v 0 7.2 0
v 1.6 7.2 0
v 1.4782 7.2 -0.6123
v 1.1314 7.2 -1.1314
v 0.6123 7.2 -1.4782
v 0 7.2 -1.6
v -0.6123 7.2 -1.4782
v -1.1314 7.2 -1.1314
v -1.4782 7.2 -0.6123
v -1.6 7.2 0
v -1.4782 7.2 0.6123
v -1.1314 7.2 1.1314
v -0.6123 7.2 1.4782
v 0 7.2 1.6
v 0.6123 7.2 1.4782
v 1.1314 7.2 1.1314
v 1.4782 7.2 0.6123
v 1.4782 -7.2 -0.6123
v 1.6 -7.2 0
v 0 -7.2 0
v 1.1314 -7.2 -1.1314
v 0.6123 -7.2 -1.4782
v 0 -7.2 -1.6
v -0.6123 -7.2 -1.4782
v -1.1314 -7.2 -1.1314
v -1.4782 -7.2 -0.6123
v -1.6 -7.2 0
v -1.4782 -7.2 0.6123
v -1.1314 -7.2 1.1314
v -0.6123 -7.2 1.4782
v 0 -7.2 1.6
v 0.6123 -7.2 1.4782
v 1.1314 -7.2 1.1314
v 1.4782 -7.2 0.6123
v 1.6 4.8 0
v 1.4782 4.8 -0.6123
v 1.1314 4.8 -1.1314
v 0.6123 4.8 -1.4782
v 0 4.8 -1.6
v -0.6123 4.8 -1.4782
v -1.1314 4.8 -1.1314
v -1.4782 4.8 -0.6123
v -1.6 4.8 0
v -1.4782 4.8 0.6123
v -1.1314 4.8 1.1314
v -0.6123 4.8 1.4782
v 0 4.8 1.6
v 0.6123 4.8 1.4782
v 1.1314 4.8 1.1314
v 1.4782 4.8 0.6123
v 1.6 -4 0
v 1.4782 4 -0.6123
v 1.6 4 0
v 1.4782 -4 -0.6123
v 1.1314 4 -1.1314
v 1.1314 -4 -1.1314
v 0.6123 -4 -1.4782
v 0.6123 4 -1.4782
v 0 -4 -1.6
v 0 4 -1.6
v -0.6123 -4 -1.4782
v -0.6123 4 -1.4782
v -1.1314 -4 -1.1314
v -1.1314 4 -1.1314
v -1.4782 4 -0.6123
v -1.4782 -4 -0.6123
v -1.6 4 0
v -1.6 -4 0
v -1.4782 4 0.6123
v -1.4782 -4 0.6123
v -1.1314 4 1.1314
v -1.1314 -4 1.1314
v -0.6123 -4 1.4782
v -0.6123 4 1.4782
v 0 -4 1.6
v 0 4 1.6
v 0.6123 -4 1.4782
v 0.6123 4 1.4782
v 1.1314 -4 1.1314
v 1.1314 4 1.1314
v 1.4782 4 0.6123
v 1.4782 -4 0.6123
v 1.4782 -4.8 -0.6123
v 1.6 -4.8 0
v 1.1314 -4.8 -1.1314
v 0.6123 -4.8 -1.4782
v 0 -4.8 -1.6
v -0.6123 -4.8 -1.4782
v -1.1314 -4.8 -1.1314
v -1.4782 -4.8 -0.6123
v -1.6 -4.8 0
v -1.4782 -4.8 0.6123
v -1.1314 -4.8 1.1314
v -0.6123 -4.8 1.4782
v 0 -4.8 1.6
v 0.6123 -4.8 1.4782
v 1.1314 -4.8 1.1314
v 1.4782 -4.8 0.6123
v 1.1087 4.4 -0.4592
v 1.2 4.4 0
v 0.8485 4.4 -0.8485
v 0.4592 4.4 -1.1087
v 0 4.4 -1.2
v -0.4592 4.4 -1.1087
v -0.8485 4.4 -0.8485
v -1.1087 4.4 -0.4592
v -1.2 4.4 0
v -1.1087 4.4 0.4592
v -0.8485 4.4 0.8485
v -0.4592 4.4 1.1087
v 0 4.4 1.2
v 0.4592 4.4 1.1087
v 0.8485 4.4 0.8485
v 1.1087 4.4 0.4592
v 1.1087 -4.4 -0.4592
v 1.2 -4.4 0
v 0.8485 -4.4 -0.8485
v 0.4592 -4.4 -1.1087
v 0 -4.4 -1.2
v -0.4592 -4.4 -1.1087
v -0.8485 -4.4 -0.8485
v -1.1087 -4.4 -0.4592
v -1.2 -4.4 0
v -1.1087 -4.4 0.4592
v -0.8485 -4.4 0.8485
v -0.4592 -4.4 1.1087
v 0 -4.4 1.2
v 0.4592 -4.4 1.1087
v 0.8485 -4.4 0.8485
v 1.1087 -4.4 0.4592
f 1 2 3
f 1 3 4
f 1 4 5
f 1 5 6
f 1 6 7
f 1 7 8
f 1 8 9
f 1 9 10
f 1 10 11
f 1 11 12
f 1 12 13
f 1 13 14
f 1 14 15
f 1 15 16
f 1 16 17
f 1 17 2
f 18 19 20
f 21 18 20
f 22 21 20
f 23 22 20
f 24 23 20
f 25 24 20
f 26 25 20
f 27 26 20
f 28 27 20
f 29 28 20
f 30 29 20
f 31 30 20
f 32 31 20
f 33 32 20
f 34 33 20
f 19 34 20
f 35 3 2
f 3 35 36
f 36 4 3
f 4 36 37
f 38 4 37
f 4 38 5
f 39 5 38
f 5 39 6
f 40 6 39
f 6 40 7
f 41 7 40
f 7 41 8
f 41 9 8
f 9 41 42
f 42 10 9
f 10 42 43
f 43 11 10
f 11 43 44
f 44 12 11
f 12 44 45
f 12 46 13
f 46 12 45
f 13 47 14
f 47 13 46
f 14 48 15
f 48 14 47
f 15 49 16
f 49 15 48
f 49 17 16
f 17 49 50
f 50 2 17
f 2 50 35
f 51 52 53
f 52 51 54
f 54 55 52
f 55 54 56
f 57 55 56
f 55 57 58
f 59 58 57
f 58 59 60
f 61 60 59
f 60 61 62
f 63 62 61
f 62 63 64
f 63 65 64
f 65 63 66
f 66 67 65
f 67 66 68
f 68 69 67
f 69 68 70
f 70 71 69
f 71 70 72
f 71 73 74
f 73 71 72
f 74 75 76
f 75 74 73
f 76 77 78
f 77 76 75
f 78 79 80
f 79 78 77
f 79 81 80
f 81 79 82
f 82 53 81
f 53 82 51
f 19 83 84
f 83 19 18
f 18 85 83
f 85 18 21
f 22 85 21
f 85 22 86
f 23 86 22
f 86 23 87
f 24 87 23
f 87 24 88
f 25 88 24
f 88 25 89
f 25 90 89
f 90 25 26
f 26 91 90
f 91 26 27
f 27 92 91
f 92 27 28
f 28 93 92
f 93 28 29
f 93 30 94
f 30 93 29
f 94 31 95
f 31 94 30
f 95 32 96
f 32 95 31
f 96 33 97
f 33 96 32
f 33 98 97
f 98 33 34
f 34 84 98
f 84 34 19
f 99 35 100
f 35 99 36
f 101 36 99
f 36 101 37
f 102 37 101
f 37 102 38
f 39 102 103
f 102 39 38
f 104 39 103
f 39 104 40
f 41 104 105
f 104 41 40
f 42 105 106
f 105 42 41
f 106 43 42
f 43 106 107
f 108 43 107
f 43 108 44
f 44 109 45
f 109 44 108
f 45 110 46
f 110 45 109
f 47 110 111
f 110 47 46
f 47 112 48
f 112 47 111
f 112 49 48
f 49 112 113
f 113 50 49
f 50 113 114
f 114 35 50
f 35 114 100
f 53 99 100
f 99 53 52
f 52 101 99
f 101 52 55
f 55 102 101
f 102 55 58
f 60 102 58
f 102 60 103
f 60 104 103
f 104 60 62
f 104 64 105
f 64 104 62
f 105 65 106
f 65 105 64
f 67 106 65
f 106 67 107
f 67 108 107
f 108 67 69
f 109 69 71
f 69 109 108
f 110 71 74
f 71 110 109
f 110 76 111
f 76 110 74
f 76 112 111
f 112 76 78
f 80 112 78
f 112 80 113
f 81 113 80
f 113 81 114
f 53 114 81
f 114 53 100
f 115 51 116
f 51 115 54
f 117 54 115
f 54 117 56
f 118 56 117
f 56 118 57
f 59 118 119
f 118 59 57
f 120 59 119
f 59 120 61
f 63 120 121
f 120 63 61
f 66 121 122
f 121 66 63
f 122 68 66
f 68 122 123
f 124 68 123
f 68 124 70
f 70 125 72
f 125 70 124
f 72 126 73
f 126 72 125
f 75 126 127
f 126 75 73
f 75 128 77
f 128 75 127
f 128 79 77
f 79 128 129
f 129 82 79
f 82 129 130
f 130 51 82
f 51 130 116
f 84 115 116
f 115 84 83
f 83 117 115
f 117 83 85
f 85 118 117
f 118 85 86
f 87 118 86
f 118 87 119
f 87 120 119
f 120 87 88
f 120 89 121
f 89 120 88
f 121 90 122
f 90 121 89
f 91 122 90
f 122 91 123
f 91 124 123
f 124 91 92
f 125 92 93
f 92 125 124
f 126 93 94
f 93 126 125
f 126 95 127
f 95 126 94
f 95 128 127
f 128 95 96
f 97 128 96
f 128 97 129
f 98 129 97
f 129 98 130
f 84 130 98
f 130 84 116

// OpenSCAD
// file: ../p/4-4edge.scad
use <../lib.scad>
function ldraw_lib__4_4edge() = [
// 0 Circle 1.0
// 0 Name: 4-4edge.dat
// 0 Author: James Jessiman
// 0 !LDRAW_ORG Primitive UPDATE 2017-01
// 0 !LICENSE Licensed under CC BY 2.0 and CC BY 4.0 : see CAreadme.txt
// 
// 0 BFC CERTIFY CCW
  [0,"BFC","CERTIFY"],
  [0,"BFC","CCW"],
// 
// 0 !HISTORY 1998-12-15 [PTadmin] Official Update 1998-10
// 0 !HISTORY 2005-12-28 [PTadmin] Official Update 2005-01
// 0 !HISTORY 2007-06-24 [PTadmin] Header formatted for Contributor Agreement
// 0 !HISTORY 2008-07-01 [PTadmin] Official Update 2008-01
// 0 !HISTORY 2017-01-15 [Steffen] BFCed
// 0 !HISTORY 2017-12-30 [PTadmin] Official Update 2017-01
// 
// 
// 2 24 1 0 0 0.9239 0 0.3827
  [2,24,1,0,0,0.9239,0,0.3827],
// 2 24 0.9239 0 0.3827 0.7071 0 0.7071
  [2,24,0.9239,0,0.3827,0.7071,0,0.7071],
// 2 24 0.7071 0 0.7071 0.3827 0 0.9239
  [2,24,0.7071,0,0.7071,0.3827,0,0.9239],
// 2 24 0.3827 0 0.9239 0 0 1
  [2,24,0.3827,0,0.9239,0,0,1],
// 2 24 0 0 1 -0.3827 0 0.9239
  [2,24,0,0,1,-0.3827,0,0.9239],
// 2 24 -0.3827 0 0.9239 -0.7071 0 0.7071
  [2,24,-0.3827,0,0.9239,-0.7071,0,0.7071],
// 2 24 -0.7071 0 0.7071 -0.9239 0 0.3827
  [2,24,-0.7071,0,0.7071,-0.9239,0,0.3827],
// 2 24 -0.9239 0 0.3827 -1 0 -0
  [2,24,-0.9239,0,0.3827,-1,0,-0],
// 2 24 -1 0 -0 -0.9239 0 -0.3827
  [2,24,-1,0,-0,-0.9239,0,-0.3827],
// 2 24 -0.9239 0 -0.3827 -0.7071 0 -0.7071
  [2,24,-0.9239,0,-0.3827,-0.7071,0,-0.7071],
// 2 24 -0.7071 0 -0.7071 -0.3827 0 -0.9239
  [2,24,-0.7071,0,-0.7071,-0.3827,0,-0.9239],
// 2 24 -0.3827 0 -0.9239 0 0 -1
  [2,24,-0.3827,0,-0.9239,0,0,-1],
// 2 24 0 0 -1 0.3827 0 -0.9239
  [2,24,0,0,-1,0.3827,0,-0.9239],
// 2 24 0.3827 0 -0.9239 0.7071 0 -0.7071
  [2,24,0.3827,0,-0.9239,0.7071,0,-0.7071],
// 2 24 0.7071 0 -0.7071 0.9239 0 -0.3827
  [2,24,0.7071,0,-0.7071,0.9239,0,-0.3827],
// 2 24 0.9239 0 -0.3827 1 0 0
  [2,24,0.9239,0,-0.3827,1,0,0],
];
makepoly(ldraw_lib__4_4edge(), line=0.2);
// file: ../p/4-4disc.scad
use <../lib.scad>
function ldraw_lib__4_4disc() = [
// 0 Disc 1.0
// 0 Name: 4-4disc.dat
// 0 Author: James Jessiman
// 0 !LDRAW_ORG Primitive UPDATE 2002-02
// 0 !LICENSE Licensed under CC BY 2.0 and CC BY 4.0 : see CAreadme.txt
// 
// 0 BFC CERTIFY CCW
  [0,"BFC","CERTIFY"],
  [0,"BFC","CCW"],
// 
// 0 !HISTORY 1998-12-15 [PTadmin] Official Update 1998-10
// 0 !HISTORY 2002-03-23 [sbliss] Added BFC statement
// 0 !HISTORY 2002-04-25 [PTadmin] Official Update 2002-02
// 0 !HISTORY 2007-06-24 [PTadmin] Header formatted for Contributor Agreement
// 0 !HISTORY 2008-07-01 [PTadmin] Official Update 2008-01
// 
// 
// 3 16 0 0 0 1 0 0 0.9239 0 0.3827
  [3,16,0,0,0,1,0,0,0.9239,0,0.3827],
// 3 16 0 0 0 0.9239 0 0.3827 0.7071 0 0.7071
  [3,16,0,0,0,0.9239,0,0.3827,0.7071,0,0.7071],
// 3 16 0 0 0 0.7071 0 0.7071 0.3827 0 0.9239
  [3,16,0,0,0,0.7071,0,0.7071,0.3827,0,0.9239],
// 3 16 0 0 0 0.3827 0 0.9239 0 0 1
  [3,16,0,0,0,0.3827,0,0.9239,0,0,1],
// 3 16 0 0 0 0 0 1 -0.3827 0 0.9239
  [3,16,0,0,0,0,0,1,-0.3827,0,0.9239],
// 3 16 0 0 0 -0.3827 0 0.9239 -0.7071 0 0.7071
  [3,16,0,0,0,-0.3827,0,0.9239,-0.7071,0,0.7071],
// 3 16 0 0 0 -0.7071 0 0.7071 -0.9239 0 0.3827
  [3,16,0,0,0,-0.7071,0,0.7071,-0.9239,0,0.3827],
// 3 16 0 0 0 -0.9239 0 0.3827 -1 0 -0
  [3,16,0,0,0,-0.9239,0,0.3827,-1,0,-0],
// 3 16 0 0 0 -1 0 -0 -0.9239 0 -0.3827
  [3,16,0,0,0,-1,0,-0,-0.9239,0,-0.3827],
// 3 16 0 0 0 -0.9239 0 -0.3827 -0.7071 0 -0.7071
  [3,16,0,0,0,-0.9239,0,-0.3827,-0.7071,0,-0.7071],
// 3 16 0 0 0 -0.7071 0 -0.7071 -0.3827 0 -0.9239
  [3,16,0,0,0,-0.7071,0,-0.7071,-0.3827,0,-0.9239],
// 3 16 0 0 0 -0.3827 0 -0.9239 0 0 -1
  [3,16,0,0,0,-0.3827,0,-0.9239,0,0,-1],
// 3 16 0 0 0 0 0 -1 0.3827 0 -0.9239
  [3,16,0,0,0,0,0,-1,0.3827,0,-0.9239],
// 3 16 0 0 0 0.3827 0 -0.9239 0.7071 0 -0.7071
  [3,16,0,0,0,0.3827,0,-0.9239,0.7071,0,-0.7071],
// 3 16 0 0 0 0.7071 0 -0.7071 0.9239 0 -0.3827
  [3,16,0,0,0,0.7071,0,-0.7071,0.9239,0,-0.3827],
// 3 16 0 0 0 0.9239 0 -0.3827 1 0 0
  [3,16,0,0,0,0.9239,0,-0.3827,1,0,0],
// 0
];
makepoly(ldraw_lib__4_4disc(), line=0.2);
// file: ../p/4-4cyli.scad
use <../lib.scad>
function ldraw_lib__4_4cyli() = [
// 0 Cylinder 1.0
// 0 Name: 4-4cyli.dat
// 0 Author: James Jessiman
// 0 !LDRAW_ORG Primitive UPDATE 2005-01
// 0 !LICENSE Licensed under CC BY 2.0 and CC BY 4.0 : see CAreadme.txt
// 
// 0 BFC CERTIFY CCW
  [0,"BFC","CERTIFY"],
  [0,"BFC","CCW"],
// 
// 0 !HISTORY 1998-12-15 [PTadmin] Official Update 1998-10
// 0 !HISTORY 2002-03-23 [sbliss] Added BFC statement; merged headers from files in distributions LDraw 0.27 and Complete.
// 0 !HISTORY 2002-04-25 [PTadmin] Official Update 2002-02
// 0 !HISTORY 2004-12-14 [guyvivan] BFC CCW
// 0 !HISTORY 2005-12-28 [PTadmin] Official Update 2005-01
// 0 !HISTORY 2007-06-24 [PTadmin] Header formatted for Contributor Agreement
// 0 !HISTORY 2008-07-01 [PTadmin] Official Update 2008-01
// 
// 
// 4 16 1 1 0 0.9239 1 0.3827 0.9239 0 0.3827 1 0 0
  [4,16,1,1,0,0.9239,1,0.3827,0.9239,0,0.3827,1,0,0],
// 5 24 1 0 0 1 1 0 0.9239 0 0.3827 0.9239 0 -0.3827
  [5,24,1,0,0,1,1,0,0.9239,0,0.3827,0.9239,0,-0.3827],
// 4 16 0.9239 1 0.3827 0.7071 1 0.7071 0.7071 0 0.7071 0.9239 0 0.3827
  [4,16,0.9239,1,0.3827,0.7071,1,0.7071,0.7071,0,0.7071,0.9239,0,0.3827],
// 5 24 0.9239 0 0.3827 0.9239 1 0.3827 0.7071 0 0.7071 1 0 0
  [5,24,0.9239,0,0.3827,0.9239,1,0.3827,0.7071,0,0.7071,1,0,0],
// 4 16 0.7071 1 0.7071 0.3827 1 0.9239 0.3827 0 0.9239 0.7071 0 0.7071
  [4,16,0.7071,1,0.7071,0.3827,1,0.9239,0.3827,0,0.9239,0.7071,0,0.7071],
// 5 24 0.7071 0 0.7071 0.7071 1 0.7071 0.3827 0 0.9239 0.9239 0 0.3827
  [5,24,0.7071,0,0.7071,0.7071,1,0.7071,0.3827,0,0.9239,0.9239,0,0.3827],
// 4 16 0.3827 1 0.9239 0 1 1 0 0 1 0.3827 0 0.9239
  [4,16,0.3827,1,0.9239,0,1,1,0,0,1,0.3827,0,0.9239],
// 5 24 0.3827 0 0.9239 0.3827 1 0.9239 0 0 1 0.7071 0 0.7071
  [5,24,0.3827,0,0.9239,0.3827,1,0.9239,0,0,1,0.7071,0,0.7071],
// 4 16 0 1 1 -0.3827 1 0.9239 -0.3827 0 0.9239 0 0 1
  [4,16,0,1,1,-0.3827,1,0.9239,-0.3827,0,0.9239,0,0,1],
// 5 24 0 0 1 0 1 1 -0.3827 0 0.9239 0.3827 0 0.9239
  [5,24,0,0,1,0,1,1,-0.3827,0,0.9239,0.3827,0,0.9239],
// 4 16 -0.3827 1 0.9239 -0.7071 1 0.7071 -0.7071 0 0.7071 -0.3827 0 0.9239
  [4,16,-0.3827,1,0.9239,-0.7071,1,0.7071,-0.7071,0,0.7071,-0.3827,0,0.9239],
// 5 24 -0.3827 0 0.9239 -0.3827 1 0.9239 -0.7071 0 0.7071 0 0 1
  [5,24,-0.3827,0,0.9239,-0.3827,1,0.9239,-0.7071,0,0.7071,0,0,1],
// 4 16 -0.7071 1 0.7071 -0.9239 1 0.3827 -0.9239 0 0.3827 -0.7071 0 0.7071
  [4,16,-0.7071,1,0.7071,-0.9239,1,0.3827,-0.9239,0,0.3827,-0.7071,0,0.7071],
// 5 24 -0.7071 0 0.7071 -0.7071 1 0.7071 -0.9239 0 0.3827 -0.3827 0 0.9239
  [5,24,-0.7071,0,0.7071,-0.7071,1,0.7071,-0.9239,0,0.3827,-0.3827,0,0.9239],
// 4 16 -0.9239 1 0.3827 -1 1 0 -1 0 0 -0.9239 0 0.3827
  [4,16,-0.9239,1,0.3827,-1,1,0,-1,0,0,-0.9239,0,0.3827],
// 5 24 -0.9239 0 0.3827 -0.9239 1 0.3827 -1 0 0 -0.7071 0 0.7071
  [5,24,-0.9239,0,0.3827,-0.9239,1,0.3827,-1,0,0,-0.7071,0,0.7071],
// 4 16 -1 1 0 -0.9239 1 -0.3827 -0.9239 0 -0.3827 -1 0 0
  [4,16,-1,1,0,-0.9239,1,-0.3827,-0.9239,0,-0.3827,-1,0,0],
// 5 24 -1 0 0 -1 1 0 -0.9239 0 -0.3827 -0.9239 0 0.3827
  [5,24,-1,0,0,-1,1,0,-0.9239,0,-0.3827,-0.9239,0,0.3827],
// 4 16 -0.9239 1 -0.3827 -0.7071 1 -0.7071 -0.7071 0 -0.7071 -0.9239 0 -0.3827
  [4,16,-0.9239,1,-0.3827,-0.7071,1,-0.7071,-0.7071,0,-0.7071,-0.9239,0,-0.3827],
// 5 24 -0.9239 0 -0.3827 -0.9239 1 -0.3827 -0.7071 0 -0.7071 -1 0 0
  [5,24,-0.9239,0,-0.3827,-0.9239,1,-0.3827,-0.7071,0,-0.7071,-1,0,0],
// 4 16 -0.7071 1 -0.7071 -0.3827 1 -0.9239 -0.3827 0 -0.9239 -0.7071 0 -0.7071
  [4,16,-0.7071,1,-0.7071,-0.3827,1,-0.9239,-0.3827,0,-0.9239,-0.7071,0,-0.7071],
// 5 24 -0.7071 0 -0.7071 -0.7071 1 -0.7071 -0.3827 0 -0.9239 -0.9239 0 -0.3827
  [5,24,-0.7071,0,-0.7071,-0.7071,1,-0.7071,-0.3827,0,-0.9239,-0.9239,0,-0.3827],
// 4 16 -0.3827 1 -0.9239 0 1 -1 0 0 -1 -0.3827 0 -0.9239
  [4,16,-0.3827,1,-0.9239,0,1,-1,0,0,-1,-0.3827,0,-0.9239],
// 5 24 -0.3827 0 -0.9239 -0.3827 1 -0.9239 0 0 -1 -0.7071 0 -0.7071
  [5,24,-0.3827,0,-0.9239,-0.3827,1,-0.9239,0,0,-1,-0.7071,0,-0.7071],
// 4 16 0 1 -1 0.3827 1 -0.9239 0.3827 0 -0.9239 0 0 -1
  [4,16,0,1,-1,0.3827,1,-0.9239,0.3827,0,-0.9239,0,0,-1],
// 5 24 0 0 -1 0 1 -1 0.3827 0 -0.9239 -0.3827 0 -0.9239
  [5,24,0,0,-1,0,1,-1,0.3827,0,-0.9239,-0.3827,0,-0.9239],
// 4 16 0.3827 1 -0.9239 0.7071 1 -0.7071 0.7071 0 -0.7071 0.3827 0 -0.9239
  [4,16,0.3827,1,-0.9239,0.7071,1,-0.7071,0.7071,0,-0.7071,0.3827,0,-0.9239],
// 5 24 0.3827 0 -0.9239 0.3827 1 -0.9239 0.7071 0 -0.7071 0 0 -1
  [5,24,0.3827,0,-0.9239,0.3827,1,-0.9239,0.7071,0,-0.7071,0,0,-1],
// 4 16 0.7071 1 -0.7071 0.9239 1 -0.3827 0.9239 0 -0.3827 0.7071 0 -0.7071
  [4,16,0.7071,1,-0.7071,0.9239,1,-0.3827,0.9239,0,-0.3827,0.7071,0,-0.7071],
// 5 24 0.7071 0 -0.7071 0.7071 1 -0.7071 0.9239 0 -0.3827 0.3827 0 -0.9239
  [5,24,0.7071,0,-0.7071,0.7071,1,-0.7071,0.9239,0,-0.3827,0.3827,0,-0.9239],
// 4 16 0.9239 1 -0.3827 1 1 0 1 0 0 0.9239 0 -0.3827
  [4,16,0.9239,1,-0.3827,1,1,0,1,0,0,0.9239,0,-0.3827],
// 5 24 0.9239 0 -0.3827 0.9239 1 -0.3827 1 0 0 0.7071 0 -0.7071
  [5,24,0.9239,0,-0.3827,0.9239,1,-0.3827,1,0,0,0.7071,0,-0.7071],
// 0
];
makepoly(ldraw_lib__4_4cyli(), line=0.2);
// file: ../p/4-4con3.scad
use <../lib.scad>
function ldraw_lib__4_4con3() = [
// 0 Cone  3 x 1.0
// 0 Name: 4-4con3.dat
// 0 Author: Niels Karsdorp [nielsk]
// 0 !LDRAW_ORG Primitive UPDATE 2003-02
// 0 !LICENSE Licensed under CC BY 2.0 and CC BY 4.0 : see CAreadme.txt
// 
// 0 BFC CERTIFY CCW
  [0,"BFC","CERTIFY"],
  [0,"BFC","CCW"],
// 
// 0 !HISTORY 2003-08-01 [PTadmin] Official Update 2003-02
// 0 !HISTORY 2007-06-24 [PTadmin] Header formatted for Contributor Agreement
// 0 !HISTORY 2008-07-01 [PTadmin] Official Update 2008-01
// 
// 
// 5 24 3 1 0 4 0 0 2.7717 1 1.1481 2.7717 1 -1.1481
  [5,24,3,1,0,4,0,0,2.7717,1,1.1481,2.7717,1,-1.1481],
// 5 24 2.7717 1 1.1481 3.6956 0 1.5308 2.1213 1 2.1213 3 1 0
  [5,24,2.7717,1,1.1481,3.6956,0,1.5308,2.1213,1,2.1213,3,1,0],
// 5 24 2.1213 1 2.1213 2.8284 0 2.8284 1.1481 1 2.7717 2.7717 1 1.1481
  [5,24,2.1213,1,2.1213,2.8284,0,2.8284,1.1481,1,2.7717,2.7717,1,1.1481],
// 5 24 1.1481 1 2.7717 1.5308 0 3.6956 0 1 3 2.1213 1 2.1213
  [5,24,1.1481,1,2.7717,1.5308,0,3.6956,0,1,3,2.1213,1,2.1213],
// 5 24 0 1 3 0 0 4 -1.1481 1 2.7717 1.1481 1 2.7717
  [5,24,0,1,3,0,0,4,-1.1481,1,2.7717,1.1481,1,2.7717],
// 5 24 -1.1481 1 2.7717 -1.5308 0 3.6956 -2.1213 1 2.1213 0 1 3
  [5,24,-1.1481,1,2.7717,-1.5308,0,3.6956,-2.1213,1,2.1213,0,1,3],
// 5 24 -2.1213 1 2.1213 -2.8284 0 2.8284 -2.7717 1 1.1481 -1.1481 1 2.7717
  [5,24,-2.1213,1,2.1213,-2.8284,0,2.8284,-2.7717,1,1.1481,-1.1481,1,2.7717],
// 5 24 -2.7717 1 1.1481 -3.6956 0 1.5308 -3 1 0 -2.1213 1 2.1213
  [5,24,-2.7717,1,1.1481,-3.6956,0,1.5308,-3,1,0,-2.1213,1,2.1213],
// 5 24 -3 1 0 -4 0 0 -2.7717 1 -1.1481 -2.7717 1 1.1481
  [5,24,-3,1,0,-4,0,0,-2.7717,1,-1.1481,-2.7717,1,1.1481],
// 5 24 -2.7717 1 -1.1481 -3.6956 0 -1.5308 -2.1213 1 -2.1213 -3 1 0
  [5,24,-2.7717,1,-1.1481,-3.6956,0,-1.5308,-2.1213,1,-2.1213,-3,1,0],
// 5 24 -2.1213 1 -2.1213 -2.8284 0 -2.8284 -1.1481 1 -2.7717 -2.7717 1 -1.1481
  [5,24,-2.1213,1,-2.1213,-2.8284,0,-2.8284,-1.1481,1,-2.7717,-2.7717,1,-1.1481],
// 5 24 -1.1481 1 -2.7717 -1.5308 0 -3.6956 0 1 -3 -2.1213 1 -2.1213
  [5,24,-1.1481,1,-2.7717,-1.5308,0,-3.6956,0,1,-3,-2.1213,1,-2.1213],
// 5 24 0 1 -3 0 0 -4 1.1481 1 -2.7717 -1.1481 1 -2.7717
  [5,24,0,1,-3,0,0,-4,1.1481,1,-2.7717,-1.1481,1,-2.7717],
// 5 24 1.1481 1 -2.7717 1.5308 0 -3.6956 2.1213 1 -2.1213 0 1 -3
  [5,24,1.1481,1,-2.7717,1.5308,0,-3.6956,2.1213,1,-2.1213,0,1,-3],
// 5 24 2.1213 1 -2.1213 2.8284 0 -2.8284 2.7717 1 -1.1481 1.1481 1 -2.7717
  [5,24,2.1213,1,-2.1213,2.8284,0,-2.8284,2.7717,1,-1.1481,1.1481,1,-2.7717],
// 5 24 2.7717 1 -1.1481 3.6956 0 -1.5308 3 1 0 2.1213 1 -2.1213
  [5,24,2.7717,1,-1.1481,3.6956,0,-1.5308,3,1,0,2.1213,1,-2.1213],
// 
// 4 16 3 1 0 2.7717 1 1.1481 3.6956 0 1.5308 4 0 0
  [4,16,3,1,0,2.7717,1,1.1481,3.6956,0,1.5308,4,0,0],
// 4 16 2.7717 1 1.1481 2.1213 1 2.1213 2.8284 0 2.8284 3.6956 0 1.5308
  [4,16,2.7717,1,1.1481,2.1213,1,2.1213,2.8284,0,2.8284,3.6956,0,1.5308],
// 4 16 2.1213 1 2.1213 1.1481 1 2.7717 1.5308 0 3.6956 2.8284 0 2.8284
  [4,16,2.1213,1,2.1213,1.1481,1,2.7717,1.5308,0,3.6956,2.8284,0,2.8284],
// 4 16 1.1481 1 2.7717 0 1 3 0 0 4 1.5308 0 3.6956
  [4,16,1.1481,1,2.7717,0,1,3,0,0,4,1.5308,0,3.6956],
// 4 16 0 1 3 -1.1481 1 2.7717 -1.5308 0 3.6956 0 0 4
  [4,16,0,1,3,-1.1481,1,2.7717,-1.5308,0,3.6956,0,0,4],
// 4 16 -1.1481 1 2.7717 -2.1213 1 2.1213 -2.8284 0 2.8284 -1.5308 0 3.6956
  [4,16,-1.1481,1,2.7717,-2.1213,1,2.1213,-2.8284,0,2.8284,-1.5308,0,3.6956],
// 4 16 -2.1213 1 2.1213 -2.7717 1 1.1481 -3.6956 0 1.5308 -2.8284 0 2.8284
  [4,16,-2.1213,1,2.1213,-2.7717,1,1.1481,-3.6956,0,1.5308,-2.8284,0,2.8284],
// 4 16 -2.7717 1 1.1481 -3 1 0 -4 0 0 -3.6956 0 1.5308
  [4,16,-2.7717,1,1.1481,-3,1,0,-4,0,0,-3.6956,0,1.5308],
// 4 16 -3 1 0 -2.7717 1 -1.1481 -3.6956 0 -1.5308 -4 0 0
  [4,16,-3,1,0,-2.7717,1,-1.1481,-3.6956,0,-1.5308,-4,0,0],
// 4 16 -2.7717 1 -1.1481 -2.1213 1 -2.1213 -2.8284 0 -2.8284 -3.6956 0 -1.5308
  [4,16,-2.7717,1,-1.1481,-2.1213,1,-2.1213,-2.8284,0,-2.8284,-3.6956,0,-1.5308],
// 4 16 -2.1213 1 -2.1213 -1.1481 1 -2.7717 -1.5308 0 -3.6956 -2.8284 0 -2.8284
  [4,16,-2.1213,1,-2.1213,-1.1481,1,-2.7717,-1.5308,0,-3.6956,-2.8284,0,-2.8284],
// 4 16 -1.1481 1 -2.7717 0 1 -3 0 0 -4 -1.5308 0 -3.6956
  [4,16,-1.1481,1,-2.7717,0,1,-3,0,0,-4,-1.5308,0,-3.6956],
// 4 16 0 1 -3 1.1481 1 -2.7717 1.5308 0 -3.6956 0 0 -4
  [4,16,0,1,-3,1.1481,1,-2.7717,1.5308,0,-3.6956,0,0,-4],
// 4 16 1.1481 1 -2.7717 2.1213 1 -2.1213 2.8284 0 -2.8284 1.5308 0 -3.6956
  [4,16,1.1481,1,-2.7717,2.1213,1,-2.1213,2.8284,0,-2.8284,1.5308,0,-3.6956],
// 4 16 2.1213 1 -2.1213 2.7717 1 -1.1481 3.6956 0 -1.5308 2.8284 0 -2.8284
  [4,16,2.1213,1,-2.1213,2.7717,1,-1.1481,3.6956,0,-1.5308,2.8284,0,-2.8284],
// 4 16 2.7717 1 -1.1481 3 1 0 4 0 0 3.6956 0 -1.5308
  [4,16,2.7717,1,-1.1481,3,1,0,4,0,0,3.6956,0,-1.5308],
// 
// 0
// 
];
makepoly(ldraw_lib__4_4con3(), line=0.2);
// main file
use <../lib.scad>
use <../p/4-4con3.scad>
use <../p/4-4cyli.scad>
use <../p/4-4disc.scad>
use <../p/4-4edge.scad>
function ldraw_lib__35b() = [
// 0 ~Wheel Axle Metal
// 0 Name: 35b.dat
// 0 Author: James Jessiman
// 0 !LDRAW_ORG Part UPDATE 2004-04
// 0 !LICENSE Licensed under CC BY 2.0 and CC BY 4.0 : see CAreadme.txt
// 
// 0 BFC CERTIFY CW
  [0,"BFC","CERTIFY"],
  [0,"BFC","CW"],
// 
// 0 !HISTORY 2002-12-29 [nielsk] BFC Certified, notch added
// 0 !HISTORY 2004-11-06 [PTadmin] Official Update 2004-04
// 0 !HISTORY 2007-06-25 [PTadmin] Header formatted for Contributor Agreement
// 0 !HISTORY 2008-07-01 [PTadmin] Official Update 2008-01
// 
// 
// 1 16 0 0 18 4 0 0 0 0 4 0 4 0 4-4edge.dat
  [1,16,0,0,18,4,0,0,0,0,4,0,4,0, ldraw_lib__4_4edge()],
// 1 16 0 0 12 4 0 0 0 0 4 0 4 0 4-4edge.dat
  [1,16,0,0,12,4,0,0,0,0,4,0,4,0, ldraw_lib__4_4edge()],
// 1 16 0 0 11 3 0 0 0 0 3 0 3 0 4-4edge.dat
  [1,16,0,0,11,3,0,0,0,0,3,0,3,0, ldraw_lib__4_4edge()],
// 1 16 0 0 10 4 0 0 0 0 4 0 4 0 4-4edge.dat
  [1,16,0,0,10,4,0,0,0,0,4,0,4,0, ldraw_lib__4_4edge()],
// 1 16 0 0 -10 4 0 0 0 0 4 0 4 0 4-4edge.dat
  [1,16,0,0,-10,4,0,0,0,0,4,0,4,0, ldraw_lib__4_4edge()],
// 1 16 0 0 -11 3 0 0 0 0 3 0 3 0 4-4edge.dat
  [1,16,0,0,-11,3,0,0,0,0,3,0,3,0, ldraw_lib__4_4edge()],
// 1 16 0 0 -12 4 0 0 0 0 4 0 4 0 4-4edge.dat
  [1,16,0,0,-12,4,0,0,0,0,4,0,4,0, ldraw_lib__4_4edge()],
// 1 16 0 0 -18 4 0 0 0 0 4 0 4 0 4-4edge.dat
  [1,16,0,0,-18,4,0,0,0,0,4,0,4,0, ldraw_lib__4_4edge()],
// 
// 1 16 0 0 18 4 0 0 0 0 4 0 -4 0 4-4disc.dat
  [1,16,0,0,18,4,0,0,0,0,4,0,-4,0, ldraw_lib__4_4disc()],
// 1 16 0 0 -18 4 0 0 0 0 4 0 4 0 4-4disc.dat
  [1,16,0,0,-18,4,0,0,0,0,4,0,4,0, ldraw_lib__4_4disc()],
// 
// 1 16 0 0 18 4 0 0 0 0 4 0 -6 0 4-4cyli.dat
  [1,16,0,0,18,4,0,0,0,0,4,0,-6,0, ldraw_lib__4_4cyli()],
// 1 16 0 0 10 4 0 0 0 0 4 0 -20 0 4-4cyli.dat
  [1,16,0,0,10,4,0,0,0,0,4,0,-20,0, ldraw_lib__4_4cyli()],
// 1 16 0 0 -12 4 0 0 0 0 4 0 -6 0 4-4cyli.dat
  [1,16,0,0,-12,4,0,0,0,0,4,0,-6,0, ldraw_lib__4_4cyli()],
// 
// 1 16 0 0 12 1 0 0 0 0 1 0 -1 0 4-4con3.dat
  [1,16,0,0,12,1,0,0,0,0,1,0,-1,0, ldraw_lib__4_4con3()],
// 1 16 0 0 10 1 0 0 0 0 1 0 1 0 4-4con3.dat
  [1,16,0,0,10,1,0,0,0,0,1,0,1,0, ldraw_lib__4_4con3()],
// 1 16 0 0 -10 1 0 0 0 0 1 0 -1 0 4-4con3.dat
  [1,16,0,0,-10,1,0,0,0,0,1,0,-1,0, ldraw_lib__4_4con3()],
// 1 16 0 0 -12 1 0 0 0 0 1 0 1 0 4-4con3.dat
  [1,16,0,0,-12,1,0,0,0,0,1,0,1,0, ldraw_lib__4_4con3()],
// 0
];
makepoly(ldraw_lib__35b(), line=0.2);
